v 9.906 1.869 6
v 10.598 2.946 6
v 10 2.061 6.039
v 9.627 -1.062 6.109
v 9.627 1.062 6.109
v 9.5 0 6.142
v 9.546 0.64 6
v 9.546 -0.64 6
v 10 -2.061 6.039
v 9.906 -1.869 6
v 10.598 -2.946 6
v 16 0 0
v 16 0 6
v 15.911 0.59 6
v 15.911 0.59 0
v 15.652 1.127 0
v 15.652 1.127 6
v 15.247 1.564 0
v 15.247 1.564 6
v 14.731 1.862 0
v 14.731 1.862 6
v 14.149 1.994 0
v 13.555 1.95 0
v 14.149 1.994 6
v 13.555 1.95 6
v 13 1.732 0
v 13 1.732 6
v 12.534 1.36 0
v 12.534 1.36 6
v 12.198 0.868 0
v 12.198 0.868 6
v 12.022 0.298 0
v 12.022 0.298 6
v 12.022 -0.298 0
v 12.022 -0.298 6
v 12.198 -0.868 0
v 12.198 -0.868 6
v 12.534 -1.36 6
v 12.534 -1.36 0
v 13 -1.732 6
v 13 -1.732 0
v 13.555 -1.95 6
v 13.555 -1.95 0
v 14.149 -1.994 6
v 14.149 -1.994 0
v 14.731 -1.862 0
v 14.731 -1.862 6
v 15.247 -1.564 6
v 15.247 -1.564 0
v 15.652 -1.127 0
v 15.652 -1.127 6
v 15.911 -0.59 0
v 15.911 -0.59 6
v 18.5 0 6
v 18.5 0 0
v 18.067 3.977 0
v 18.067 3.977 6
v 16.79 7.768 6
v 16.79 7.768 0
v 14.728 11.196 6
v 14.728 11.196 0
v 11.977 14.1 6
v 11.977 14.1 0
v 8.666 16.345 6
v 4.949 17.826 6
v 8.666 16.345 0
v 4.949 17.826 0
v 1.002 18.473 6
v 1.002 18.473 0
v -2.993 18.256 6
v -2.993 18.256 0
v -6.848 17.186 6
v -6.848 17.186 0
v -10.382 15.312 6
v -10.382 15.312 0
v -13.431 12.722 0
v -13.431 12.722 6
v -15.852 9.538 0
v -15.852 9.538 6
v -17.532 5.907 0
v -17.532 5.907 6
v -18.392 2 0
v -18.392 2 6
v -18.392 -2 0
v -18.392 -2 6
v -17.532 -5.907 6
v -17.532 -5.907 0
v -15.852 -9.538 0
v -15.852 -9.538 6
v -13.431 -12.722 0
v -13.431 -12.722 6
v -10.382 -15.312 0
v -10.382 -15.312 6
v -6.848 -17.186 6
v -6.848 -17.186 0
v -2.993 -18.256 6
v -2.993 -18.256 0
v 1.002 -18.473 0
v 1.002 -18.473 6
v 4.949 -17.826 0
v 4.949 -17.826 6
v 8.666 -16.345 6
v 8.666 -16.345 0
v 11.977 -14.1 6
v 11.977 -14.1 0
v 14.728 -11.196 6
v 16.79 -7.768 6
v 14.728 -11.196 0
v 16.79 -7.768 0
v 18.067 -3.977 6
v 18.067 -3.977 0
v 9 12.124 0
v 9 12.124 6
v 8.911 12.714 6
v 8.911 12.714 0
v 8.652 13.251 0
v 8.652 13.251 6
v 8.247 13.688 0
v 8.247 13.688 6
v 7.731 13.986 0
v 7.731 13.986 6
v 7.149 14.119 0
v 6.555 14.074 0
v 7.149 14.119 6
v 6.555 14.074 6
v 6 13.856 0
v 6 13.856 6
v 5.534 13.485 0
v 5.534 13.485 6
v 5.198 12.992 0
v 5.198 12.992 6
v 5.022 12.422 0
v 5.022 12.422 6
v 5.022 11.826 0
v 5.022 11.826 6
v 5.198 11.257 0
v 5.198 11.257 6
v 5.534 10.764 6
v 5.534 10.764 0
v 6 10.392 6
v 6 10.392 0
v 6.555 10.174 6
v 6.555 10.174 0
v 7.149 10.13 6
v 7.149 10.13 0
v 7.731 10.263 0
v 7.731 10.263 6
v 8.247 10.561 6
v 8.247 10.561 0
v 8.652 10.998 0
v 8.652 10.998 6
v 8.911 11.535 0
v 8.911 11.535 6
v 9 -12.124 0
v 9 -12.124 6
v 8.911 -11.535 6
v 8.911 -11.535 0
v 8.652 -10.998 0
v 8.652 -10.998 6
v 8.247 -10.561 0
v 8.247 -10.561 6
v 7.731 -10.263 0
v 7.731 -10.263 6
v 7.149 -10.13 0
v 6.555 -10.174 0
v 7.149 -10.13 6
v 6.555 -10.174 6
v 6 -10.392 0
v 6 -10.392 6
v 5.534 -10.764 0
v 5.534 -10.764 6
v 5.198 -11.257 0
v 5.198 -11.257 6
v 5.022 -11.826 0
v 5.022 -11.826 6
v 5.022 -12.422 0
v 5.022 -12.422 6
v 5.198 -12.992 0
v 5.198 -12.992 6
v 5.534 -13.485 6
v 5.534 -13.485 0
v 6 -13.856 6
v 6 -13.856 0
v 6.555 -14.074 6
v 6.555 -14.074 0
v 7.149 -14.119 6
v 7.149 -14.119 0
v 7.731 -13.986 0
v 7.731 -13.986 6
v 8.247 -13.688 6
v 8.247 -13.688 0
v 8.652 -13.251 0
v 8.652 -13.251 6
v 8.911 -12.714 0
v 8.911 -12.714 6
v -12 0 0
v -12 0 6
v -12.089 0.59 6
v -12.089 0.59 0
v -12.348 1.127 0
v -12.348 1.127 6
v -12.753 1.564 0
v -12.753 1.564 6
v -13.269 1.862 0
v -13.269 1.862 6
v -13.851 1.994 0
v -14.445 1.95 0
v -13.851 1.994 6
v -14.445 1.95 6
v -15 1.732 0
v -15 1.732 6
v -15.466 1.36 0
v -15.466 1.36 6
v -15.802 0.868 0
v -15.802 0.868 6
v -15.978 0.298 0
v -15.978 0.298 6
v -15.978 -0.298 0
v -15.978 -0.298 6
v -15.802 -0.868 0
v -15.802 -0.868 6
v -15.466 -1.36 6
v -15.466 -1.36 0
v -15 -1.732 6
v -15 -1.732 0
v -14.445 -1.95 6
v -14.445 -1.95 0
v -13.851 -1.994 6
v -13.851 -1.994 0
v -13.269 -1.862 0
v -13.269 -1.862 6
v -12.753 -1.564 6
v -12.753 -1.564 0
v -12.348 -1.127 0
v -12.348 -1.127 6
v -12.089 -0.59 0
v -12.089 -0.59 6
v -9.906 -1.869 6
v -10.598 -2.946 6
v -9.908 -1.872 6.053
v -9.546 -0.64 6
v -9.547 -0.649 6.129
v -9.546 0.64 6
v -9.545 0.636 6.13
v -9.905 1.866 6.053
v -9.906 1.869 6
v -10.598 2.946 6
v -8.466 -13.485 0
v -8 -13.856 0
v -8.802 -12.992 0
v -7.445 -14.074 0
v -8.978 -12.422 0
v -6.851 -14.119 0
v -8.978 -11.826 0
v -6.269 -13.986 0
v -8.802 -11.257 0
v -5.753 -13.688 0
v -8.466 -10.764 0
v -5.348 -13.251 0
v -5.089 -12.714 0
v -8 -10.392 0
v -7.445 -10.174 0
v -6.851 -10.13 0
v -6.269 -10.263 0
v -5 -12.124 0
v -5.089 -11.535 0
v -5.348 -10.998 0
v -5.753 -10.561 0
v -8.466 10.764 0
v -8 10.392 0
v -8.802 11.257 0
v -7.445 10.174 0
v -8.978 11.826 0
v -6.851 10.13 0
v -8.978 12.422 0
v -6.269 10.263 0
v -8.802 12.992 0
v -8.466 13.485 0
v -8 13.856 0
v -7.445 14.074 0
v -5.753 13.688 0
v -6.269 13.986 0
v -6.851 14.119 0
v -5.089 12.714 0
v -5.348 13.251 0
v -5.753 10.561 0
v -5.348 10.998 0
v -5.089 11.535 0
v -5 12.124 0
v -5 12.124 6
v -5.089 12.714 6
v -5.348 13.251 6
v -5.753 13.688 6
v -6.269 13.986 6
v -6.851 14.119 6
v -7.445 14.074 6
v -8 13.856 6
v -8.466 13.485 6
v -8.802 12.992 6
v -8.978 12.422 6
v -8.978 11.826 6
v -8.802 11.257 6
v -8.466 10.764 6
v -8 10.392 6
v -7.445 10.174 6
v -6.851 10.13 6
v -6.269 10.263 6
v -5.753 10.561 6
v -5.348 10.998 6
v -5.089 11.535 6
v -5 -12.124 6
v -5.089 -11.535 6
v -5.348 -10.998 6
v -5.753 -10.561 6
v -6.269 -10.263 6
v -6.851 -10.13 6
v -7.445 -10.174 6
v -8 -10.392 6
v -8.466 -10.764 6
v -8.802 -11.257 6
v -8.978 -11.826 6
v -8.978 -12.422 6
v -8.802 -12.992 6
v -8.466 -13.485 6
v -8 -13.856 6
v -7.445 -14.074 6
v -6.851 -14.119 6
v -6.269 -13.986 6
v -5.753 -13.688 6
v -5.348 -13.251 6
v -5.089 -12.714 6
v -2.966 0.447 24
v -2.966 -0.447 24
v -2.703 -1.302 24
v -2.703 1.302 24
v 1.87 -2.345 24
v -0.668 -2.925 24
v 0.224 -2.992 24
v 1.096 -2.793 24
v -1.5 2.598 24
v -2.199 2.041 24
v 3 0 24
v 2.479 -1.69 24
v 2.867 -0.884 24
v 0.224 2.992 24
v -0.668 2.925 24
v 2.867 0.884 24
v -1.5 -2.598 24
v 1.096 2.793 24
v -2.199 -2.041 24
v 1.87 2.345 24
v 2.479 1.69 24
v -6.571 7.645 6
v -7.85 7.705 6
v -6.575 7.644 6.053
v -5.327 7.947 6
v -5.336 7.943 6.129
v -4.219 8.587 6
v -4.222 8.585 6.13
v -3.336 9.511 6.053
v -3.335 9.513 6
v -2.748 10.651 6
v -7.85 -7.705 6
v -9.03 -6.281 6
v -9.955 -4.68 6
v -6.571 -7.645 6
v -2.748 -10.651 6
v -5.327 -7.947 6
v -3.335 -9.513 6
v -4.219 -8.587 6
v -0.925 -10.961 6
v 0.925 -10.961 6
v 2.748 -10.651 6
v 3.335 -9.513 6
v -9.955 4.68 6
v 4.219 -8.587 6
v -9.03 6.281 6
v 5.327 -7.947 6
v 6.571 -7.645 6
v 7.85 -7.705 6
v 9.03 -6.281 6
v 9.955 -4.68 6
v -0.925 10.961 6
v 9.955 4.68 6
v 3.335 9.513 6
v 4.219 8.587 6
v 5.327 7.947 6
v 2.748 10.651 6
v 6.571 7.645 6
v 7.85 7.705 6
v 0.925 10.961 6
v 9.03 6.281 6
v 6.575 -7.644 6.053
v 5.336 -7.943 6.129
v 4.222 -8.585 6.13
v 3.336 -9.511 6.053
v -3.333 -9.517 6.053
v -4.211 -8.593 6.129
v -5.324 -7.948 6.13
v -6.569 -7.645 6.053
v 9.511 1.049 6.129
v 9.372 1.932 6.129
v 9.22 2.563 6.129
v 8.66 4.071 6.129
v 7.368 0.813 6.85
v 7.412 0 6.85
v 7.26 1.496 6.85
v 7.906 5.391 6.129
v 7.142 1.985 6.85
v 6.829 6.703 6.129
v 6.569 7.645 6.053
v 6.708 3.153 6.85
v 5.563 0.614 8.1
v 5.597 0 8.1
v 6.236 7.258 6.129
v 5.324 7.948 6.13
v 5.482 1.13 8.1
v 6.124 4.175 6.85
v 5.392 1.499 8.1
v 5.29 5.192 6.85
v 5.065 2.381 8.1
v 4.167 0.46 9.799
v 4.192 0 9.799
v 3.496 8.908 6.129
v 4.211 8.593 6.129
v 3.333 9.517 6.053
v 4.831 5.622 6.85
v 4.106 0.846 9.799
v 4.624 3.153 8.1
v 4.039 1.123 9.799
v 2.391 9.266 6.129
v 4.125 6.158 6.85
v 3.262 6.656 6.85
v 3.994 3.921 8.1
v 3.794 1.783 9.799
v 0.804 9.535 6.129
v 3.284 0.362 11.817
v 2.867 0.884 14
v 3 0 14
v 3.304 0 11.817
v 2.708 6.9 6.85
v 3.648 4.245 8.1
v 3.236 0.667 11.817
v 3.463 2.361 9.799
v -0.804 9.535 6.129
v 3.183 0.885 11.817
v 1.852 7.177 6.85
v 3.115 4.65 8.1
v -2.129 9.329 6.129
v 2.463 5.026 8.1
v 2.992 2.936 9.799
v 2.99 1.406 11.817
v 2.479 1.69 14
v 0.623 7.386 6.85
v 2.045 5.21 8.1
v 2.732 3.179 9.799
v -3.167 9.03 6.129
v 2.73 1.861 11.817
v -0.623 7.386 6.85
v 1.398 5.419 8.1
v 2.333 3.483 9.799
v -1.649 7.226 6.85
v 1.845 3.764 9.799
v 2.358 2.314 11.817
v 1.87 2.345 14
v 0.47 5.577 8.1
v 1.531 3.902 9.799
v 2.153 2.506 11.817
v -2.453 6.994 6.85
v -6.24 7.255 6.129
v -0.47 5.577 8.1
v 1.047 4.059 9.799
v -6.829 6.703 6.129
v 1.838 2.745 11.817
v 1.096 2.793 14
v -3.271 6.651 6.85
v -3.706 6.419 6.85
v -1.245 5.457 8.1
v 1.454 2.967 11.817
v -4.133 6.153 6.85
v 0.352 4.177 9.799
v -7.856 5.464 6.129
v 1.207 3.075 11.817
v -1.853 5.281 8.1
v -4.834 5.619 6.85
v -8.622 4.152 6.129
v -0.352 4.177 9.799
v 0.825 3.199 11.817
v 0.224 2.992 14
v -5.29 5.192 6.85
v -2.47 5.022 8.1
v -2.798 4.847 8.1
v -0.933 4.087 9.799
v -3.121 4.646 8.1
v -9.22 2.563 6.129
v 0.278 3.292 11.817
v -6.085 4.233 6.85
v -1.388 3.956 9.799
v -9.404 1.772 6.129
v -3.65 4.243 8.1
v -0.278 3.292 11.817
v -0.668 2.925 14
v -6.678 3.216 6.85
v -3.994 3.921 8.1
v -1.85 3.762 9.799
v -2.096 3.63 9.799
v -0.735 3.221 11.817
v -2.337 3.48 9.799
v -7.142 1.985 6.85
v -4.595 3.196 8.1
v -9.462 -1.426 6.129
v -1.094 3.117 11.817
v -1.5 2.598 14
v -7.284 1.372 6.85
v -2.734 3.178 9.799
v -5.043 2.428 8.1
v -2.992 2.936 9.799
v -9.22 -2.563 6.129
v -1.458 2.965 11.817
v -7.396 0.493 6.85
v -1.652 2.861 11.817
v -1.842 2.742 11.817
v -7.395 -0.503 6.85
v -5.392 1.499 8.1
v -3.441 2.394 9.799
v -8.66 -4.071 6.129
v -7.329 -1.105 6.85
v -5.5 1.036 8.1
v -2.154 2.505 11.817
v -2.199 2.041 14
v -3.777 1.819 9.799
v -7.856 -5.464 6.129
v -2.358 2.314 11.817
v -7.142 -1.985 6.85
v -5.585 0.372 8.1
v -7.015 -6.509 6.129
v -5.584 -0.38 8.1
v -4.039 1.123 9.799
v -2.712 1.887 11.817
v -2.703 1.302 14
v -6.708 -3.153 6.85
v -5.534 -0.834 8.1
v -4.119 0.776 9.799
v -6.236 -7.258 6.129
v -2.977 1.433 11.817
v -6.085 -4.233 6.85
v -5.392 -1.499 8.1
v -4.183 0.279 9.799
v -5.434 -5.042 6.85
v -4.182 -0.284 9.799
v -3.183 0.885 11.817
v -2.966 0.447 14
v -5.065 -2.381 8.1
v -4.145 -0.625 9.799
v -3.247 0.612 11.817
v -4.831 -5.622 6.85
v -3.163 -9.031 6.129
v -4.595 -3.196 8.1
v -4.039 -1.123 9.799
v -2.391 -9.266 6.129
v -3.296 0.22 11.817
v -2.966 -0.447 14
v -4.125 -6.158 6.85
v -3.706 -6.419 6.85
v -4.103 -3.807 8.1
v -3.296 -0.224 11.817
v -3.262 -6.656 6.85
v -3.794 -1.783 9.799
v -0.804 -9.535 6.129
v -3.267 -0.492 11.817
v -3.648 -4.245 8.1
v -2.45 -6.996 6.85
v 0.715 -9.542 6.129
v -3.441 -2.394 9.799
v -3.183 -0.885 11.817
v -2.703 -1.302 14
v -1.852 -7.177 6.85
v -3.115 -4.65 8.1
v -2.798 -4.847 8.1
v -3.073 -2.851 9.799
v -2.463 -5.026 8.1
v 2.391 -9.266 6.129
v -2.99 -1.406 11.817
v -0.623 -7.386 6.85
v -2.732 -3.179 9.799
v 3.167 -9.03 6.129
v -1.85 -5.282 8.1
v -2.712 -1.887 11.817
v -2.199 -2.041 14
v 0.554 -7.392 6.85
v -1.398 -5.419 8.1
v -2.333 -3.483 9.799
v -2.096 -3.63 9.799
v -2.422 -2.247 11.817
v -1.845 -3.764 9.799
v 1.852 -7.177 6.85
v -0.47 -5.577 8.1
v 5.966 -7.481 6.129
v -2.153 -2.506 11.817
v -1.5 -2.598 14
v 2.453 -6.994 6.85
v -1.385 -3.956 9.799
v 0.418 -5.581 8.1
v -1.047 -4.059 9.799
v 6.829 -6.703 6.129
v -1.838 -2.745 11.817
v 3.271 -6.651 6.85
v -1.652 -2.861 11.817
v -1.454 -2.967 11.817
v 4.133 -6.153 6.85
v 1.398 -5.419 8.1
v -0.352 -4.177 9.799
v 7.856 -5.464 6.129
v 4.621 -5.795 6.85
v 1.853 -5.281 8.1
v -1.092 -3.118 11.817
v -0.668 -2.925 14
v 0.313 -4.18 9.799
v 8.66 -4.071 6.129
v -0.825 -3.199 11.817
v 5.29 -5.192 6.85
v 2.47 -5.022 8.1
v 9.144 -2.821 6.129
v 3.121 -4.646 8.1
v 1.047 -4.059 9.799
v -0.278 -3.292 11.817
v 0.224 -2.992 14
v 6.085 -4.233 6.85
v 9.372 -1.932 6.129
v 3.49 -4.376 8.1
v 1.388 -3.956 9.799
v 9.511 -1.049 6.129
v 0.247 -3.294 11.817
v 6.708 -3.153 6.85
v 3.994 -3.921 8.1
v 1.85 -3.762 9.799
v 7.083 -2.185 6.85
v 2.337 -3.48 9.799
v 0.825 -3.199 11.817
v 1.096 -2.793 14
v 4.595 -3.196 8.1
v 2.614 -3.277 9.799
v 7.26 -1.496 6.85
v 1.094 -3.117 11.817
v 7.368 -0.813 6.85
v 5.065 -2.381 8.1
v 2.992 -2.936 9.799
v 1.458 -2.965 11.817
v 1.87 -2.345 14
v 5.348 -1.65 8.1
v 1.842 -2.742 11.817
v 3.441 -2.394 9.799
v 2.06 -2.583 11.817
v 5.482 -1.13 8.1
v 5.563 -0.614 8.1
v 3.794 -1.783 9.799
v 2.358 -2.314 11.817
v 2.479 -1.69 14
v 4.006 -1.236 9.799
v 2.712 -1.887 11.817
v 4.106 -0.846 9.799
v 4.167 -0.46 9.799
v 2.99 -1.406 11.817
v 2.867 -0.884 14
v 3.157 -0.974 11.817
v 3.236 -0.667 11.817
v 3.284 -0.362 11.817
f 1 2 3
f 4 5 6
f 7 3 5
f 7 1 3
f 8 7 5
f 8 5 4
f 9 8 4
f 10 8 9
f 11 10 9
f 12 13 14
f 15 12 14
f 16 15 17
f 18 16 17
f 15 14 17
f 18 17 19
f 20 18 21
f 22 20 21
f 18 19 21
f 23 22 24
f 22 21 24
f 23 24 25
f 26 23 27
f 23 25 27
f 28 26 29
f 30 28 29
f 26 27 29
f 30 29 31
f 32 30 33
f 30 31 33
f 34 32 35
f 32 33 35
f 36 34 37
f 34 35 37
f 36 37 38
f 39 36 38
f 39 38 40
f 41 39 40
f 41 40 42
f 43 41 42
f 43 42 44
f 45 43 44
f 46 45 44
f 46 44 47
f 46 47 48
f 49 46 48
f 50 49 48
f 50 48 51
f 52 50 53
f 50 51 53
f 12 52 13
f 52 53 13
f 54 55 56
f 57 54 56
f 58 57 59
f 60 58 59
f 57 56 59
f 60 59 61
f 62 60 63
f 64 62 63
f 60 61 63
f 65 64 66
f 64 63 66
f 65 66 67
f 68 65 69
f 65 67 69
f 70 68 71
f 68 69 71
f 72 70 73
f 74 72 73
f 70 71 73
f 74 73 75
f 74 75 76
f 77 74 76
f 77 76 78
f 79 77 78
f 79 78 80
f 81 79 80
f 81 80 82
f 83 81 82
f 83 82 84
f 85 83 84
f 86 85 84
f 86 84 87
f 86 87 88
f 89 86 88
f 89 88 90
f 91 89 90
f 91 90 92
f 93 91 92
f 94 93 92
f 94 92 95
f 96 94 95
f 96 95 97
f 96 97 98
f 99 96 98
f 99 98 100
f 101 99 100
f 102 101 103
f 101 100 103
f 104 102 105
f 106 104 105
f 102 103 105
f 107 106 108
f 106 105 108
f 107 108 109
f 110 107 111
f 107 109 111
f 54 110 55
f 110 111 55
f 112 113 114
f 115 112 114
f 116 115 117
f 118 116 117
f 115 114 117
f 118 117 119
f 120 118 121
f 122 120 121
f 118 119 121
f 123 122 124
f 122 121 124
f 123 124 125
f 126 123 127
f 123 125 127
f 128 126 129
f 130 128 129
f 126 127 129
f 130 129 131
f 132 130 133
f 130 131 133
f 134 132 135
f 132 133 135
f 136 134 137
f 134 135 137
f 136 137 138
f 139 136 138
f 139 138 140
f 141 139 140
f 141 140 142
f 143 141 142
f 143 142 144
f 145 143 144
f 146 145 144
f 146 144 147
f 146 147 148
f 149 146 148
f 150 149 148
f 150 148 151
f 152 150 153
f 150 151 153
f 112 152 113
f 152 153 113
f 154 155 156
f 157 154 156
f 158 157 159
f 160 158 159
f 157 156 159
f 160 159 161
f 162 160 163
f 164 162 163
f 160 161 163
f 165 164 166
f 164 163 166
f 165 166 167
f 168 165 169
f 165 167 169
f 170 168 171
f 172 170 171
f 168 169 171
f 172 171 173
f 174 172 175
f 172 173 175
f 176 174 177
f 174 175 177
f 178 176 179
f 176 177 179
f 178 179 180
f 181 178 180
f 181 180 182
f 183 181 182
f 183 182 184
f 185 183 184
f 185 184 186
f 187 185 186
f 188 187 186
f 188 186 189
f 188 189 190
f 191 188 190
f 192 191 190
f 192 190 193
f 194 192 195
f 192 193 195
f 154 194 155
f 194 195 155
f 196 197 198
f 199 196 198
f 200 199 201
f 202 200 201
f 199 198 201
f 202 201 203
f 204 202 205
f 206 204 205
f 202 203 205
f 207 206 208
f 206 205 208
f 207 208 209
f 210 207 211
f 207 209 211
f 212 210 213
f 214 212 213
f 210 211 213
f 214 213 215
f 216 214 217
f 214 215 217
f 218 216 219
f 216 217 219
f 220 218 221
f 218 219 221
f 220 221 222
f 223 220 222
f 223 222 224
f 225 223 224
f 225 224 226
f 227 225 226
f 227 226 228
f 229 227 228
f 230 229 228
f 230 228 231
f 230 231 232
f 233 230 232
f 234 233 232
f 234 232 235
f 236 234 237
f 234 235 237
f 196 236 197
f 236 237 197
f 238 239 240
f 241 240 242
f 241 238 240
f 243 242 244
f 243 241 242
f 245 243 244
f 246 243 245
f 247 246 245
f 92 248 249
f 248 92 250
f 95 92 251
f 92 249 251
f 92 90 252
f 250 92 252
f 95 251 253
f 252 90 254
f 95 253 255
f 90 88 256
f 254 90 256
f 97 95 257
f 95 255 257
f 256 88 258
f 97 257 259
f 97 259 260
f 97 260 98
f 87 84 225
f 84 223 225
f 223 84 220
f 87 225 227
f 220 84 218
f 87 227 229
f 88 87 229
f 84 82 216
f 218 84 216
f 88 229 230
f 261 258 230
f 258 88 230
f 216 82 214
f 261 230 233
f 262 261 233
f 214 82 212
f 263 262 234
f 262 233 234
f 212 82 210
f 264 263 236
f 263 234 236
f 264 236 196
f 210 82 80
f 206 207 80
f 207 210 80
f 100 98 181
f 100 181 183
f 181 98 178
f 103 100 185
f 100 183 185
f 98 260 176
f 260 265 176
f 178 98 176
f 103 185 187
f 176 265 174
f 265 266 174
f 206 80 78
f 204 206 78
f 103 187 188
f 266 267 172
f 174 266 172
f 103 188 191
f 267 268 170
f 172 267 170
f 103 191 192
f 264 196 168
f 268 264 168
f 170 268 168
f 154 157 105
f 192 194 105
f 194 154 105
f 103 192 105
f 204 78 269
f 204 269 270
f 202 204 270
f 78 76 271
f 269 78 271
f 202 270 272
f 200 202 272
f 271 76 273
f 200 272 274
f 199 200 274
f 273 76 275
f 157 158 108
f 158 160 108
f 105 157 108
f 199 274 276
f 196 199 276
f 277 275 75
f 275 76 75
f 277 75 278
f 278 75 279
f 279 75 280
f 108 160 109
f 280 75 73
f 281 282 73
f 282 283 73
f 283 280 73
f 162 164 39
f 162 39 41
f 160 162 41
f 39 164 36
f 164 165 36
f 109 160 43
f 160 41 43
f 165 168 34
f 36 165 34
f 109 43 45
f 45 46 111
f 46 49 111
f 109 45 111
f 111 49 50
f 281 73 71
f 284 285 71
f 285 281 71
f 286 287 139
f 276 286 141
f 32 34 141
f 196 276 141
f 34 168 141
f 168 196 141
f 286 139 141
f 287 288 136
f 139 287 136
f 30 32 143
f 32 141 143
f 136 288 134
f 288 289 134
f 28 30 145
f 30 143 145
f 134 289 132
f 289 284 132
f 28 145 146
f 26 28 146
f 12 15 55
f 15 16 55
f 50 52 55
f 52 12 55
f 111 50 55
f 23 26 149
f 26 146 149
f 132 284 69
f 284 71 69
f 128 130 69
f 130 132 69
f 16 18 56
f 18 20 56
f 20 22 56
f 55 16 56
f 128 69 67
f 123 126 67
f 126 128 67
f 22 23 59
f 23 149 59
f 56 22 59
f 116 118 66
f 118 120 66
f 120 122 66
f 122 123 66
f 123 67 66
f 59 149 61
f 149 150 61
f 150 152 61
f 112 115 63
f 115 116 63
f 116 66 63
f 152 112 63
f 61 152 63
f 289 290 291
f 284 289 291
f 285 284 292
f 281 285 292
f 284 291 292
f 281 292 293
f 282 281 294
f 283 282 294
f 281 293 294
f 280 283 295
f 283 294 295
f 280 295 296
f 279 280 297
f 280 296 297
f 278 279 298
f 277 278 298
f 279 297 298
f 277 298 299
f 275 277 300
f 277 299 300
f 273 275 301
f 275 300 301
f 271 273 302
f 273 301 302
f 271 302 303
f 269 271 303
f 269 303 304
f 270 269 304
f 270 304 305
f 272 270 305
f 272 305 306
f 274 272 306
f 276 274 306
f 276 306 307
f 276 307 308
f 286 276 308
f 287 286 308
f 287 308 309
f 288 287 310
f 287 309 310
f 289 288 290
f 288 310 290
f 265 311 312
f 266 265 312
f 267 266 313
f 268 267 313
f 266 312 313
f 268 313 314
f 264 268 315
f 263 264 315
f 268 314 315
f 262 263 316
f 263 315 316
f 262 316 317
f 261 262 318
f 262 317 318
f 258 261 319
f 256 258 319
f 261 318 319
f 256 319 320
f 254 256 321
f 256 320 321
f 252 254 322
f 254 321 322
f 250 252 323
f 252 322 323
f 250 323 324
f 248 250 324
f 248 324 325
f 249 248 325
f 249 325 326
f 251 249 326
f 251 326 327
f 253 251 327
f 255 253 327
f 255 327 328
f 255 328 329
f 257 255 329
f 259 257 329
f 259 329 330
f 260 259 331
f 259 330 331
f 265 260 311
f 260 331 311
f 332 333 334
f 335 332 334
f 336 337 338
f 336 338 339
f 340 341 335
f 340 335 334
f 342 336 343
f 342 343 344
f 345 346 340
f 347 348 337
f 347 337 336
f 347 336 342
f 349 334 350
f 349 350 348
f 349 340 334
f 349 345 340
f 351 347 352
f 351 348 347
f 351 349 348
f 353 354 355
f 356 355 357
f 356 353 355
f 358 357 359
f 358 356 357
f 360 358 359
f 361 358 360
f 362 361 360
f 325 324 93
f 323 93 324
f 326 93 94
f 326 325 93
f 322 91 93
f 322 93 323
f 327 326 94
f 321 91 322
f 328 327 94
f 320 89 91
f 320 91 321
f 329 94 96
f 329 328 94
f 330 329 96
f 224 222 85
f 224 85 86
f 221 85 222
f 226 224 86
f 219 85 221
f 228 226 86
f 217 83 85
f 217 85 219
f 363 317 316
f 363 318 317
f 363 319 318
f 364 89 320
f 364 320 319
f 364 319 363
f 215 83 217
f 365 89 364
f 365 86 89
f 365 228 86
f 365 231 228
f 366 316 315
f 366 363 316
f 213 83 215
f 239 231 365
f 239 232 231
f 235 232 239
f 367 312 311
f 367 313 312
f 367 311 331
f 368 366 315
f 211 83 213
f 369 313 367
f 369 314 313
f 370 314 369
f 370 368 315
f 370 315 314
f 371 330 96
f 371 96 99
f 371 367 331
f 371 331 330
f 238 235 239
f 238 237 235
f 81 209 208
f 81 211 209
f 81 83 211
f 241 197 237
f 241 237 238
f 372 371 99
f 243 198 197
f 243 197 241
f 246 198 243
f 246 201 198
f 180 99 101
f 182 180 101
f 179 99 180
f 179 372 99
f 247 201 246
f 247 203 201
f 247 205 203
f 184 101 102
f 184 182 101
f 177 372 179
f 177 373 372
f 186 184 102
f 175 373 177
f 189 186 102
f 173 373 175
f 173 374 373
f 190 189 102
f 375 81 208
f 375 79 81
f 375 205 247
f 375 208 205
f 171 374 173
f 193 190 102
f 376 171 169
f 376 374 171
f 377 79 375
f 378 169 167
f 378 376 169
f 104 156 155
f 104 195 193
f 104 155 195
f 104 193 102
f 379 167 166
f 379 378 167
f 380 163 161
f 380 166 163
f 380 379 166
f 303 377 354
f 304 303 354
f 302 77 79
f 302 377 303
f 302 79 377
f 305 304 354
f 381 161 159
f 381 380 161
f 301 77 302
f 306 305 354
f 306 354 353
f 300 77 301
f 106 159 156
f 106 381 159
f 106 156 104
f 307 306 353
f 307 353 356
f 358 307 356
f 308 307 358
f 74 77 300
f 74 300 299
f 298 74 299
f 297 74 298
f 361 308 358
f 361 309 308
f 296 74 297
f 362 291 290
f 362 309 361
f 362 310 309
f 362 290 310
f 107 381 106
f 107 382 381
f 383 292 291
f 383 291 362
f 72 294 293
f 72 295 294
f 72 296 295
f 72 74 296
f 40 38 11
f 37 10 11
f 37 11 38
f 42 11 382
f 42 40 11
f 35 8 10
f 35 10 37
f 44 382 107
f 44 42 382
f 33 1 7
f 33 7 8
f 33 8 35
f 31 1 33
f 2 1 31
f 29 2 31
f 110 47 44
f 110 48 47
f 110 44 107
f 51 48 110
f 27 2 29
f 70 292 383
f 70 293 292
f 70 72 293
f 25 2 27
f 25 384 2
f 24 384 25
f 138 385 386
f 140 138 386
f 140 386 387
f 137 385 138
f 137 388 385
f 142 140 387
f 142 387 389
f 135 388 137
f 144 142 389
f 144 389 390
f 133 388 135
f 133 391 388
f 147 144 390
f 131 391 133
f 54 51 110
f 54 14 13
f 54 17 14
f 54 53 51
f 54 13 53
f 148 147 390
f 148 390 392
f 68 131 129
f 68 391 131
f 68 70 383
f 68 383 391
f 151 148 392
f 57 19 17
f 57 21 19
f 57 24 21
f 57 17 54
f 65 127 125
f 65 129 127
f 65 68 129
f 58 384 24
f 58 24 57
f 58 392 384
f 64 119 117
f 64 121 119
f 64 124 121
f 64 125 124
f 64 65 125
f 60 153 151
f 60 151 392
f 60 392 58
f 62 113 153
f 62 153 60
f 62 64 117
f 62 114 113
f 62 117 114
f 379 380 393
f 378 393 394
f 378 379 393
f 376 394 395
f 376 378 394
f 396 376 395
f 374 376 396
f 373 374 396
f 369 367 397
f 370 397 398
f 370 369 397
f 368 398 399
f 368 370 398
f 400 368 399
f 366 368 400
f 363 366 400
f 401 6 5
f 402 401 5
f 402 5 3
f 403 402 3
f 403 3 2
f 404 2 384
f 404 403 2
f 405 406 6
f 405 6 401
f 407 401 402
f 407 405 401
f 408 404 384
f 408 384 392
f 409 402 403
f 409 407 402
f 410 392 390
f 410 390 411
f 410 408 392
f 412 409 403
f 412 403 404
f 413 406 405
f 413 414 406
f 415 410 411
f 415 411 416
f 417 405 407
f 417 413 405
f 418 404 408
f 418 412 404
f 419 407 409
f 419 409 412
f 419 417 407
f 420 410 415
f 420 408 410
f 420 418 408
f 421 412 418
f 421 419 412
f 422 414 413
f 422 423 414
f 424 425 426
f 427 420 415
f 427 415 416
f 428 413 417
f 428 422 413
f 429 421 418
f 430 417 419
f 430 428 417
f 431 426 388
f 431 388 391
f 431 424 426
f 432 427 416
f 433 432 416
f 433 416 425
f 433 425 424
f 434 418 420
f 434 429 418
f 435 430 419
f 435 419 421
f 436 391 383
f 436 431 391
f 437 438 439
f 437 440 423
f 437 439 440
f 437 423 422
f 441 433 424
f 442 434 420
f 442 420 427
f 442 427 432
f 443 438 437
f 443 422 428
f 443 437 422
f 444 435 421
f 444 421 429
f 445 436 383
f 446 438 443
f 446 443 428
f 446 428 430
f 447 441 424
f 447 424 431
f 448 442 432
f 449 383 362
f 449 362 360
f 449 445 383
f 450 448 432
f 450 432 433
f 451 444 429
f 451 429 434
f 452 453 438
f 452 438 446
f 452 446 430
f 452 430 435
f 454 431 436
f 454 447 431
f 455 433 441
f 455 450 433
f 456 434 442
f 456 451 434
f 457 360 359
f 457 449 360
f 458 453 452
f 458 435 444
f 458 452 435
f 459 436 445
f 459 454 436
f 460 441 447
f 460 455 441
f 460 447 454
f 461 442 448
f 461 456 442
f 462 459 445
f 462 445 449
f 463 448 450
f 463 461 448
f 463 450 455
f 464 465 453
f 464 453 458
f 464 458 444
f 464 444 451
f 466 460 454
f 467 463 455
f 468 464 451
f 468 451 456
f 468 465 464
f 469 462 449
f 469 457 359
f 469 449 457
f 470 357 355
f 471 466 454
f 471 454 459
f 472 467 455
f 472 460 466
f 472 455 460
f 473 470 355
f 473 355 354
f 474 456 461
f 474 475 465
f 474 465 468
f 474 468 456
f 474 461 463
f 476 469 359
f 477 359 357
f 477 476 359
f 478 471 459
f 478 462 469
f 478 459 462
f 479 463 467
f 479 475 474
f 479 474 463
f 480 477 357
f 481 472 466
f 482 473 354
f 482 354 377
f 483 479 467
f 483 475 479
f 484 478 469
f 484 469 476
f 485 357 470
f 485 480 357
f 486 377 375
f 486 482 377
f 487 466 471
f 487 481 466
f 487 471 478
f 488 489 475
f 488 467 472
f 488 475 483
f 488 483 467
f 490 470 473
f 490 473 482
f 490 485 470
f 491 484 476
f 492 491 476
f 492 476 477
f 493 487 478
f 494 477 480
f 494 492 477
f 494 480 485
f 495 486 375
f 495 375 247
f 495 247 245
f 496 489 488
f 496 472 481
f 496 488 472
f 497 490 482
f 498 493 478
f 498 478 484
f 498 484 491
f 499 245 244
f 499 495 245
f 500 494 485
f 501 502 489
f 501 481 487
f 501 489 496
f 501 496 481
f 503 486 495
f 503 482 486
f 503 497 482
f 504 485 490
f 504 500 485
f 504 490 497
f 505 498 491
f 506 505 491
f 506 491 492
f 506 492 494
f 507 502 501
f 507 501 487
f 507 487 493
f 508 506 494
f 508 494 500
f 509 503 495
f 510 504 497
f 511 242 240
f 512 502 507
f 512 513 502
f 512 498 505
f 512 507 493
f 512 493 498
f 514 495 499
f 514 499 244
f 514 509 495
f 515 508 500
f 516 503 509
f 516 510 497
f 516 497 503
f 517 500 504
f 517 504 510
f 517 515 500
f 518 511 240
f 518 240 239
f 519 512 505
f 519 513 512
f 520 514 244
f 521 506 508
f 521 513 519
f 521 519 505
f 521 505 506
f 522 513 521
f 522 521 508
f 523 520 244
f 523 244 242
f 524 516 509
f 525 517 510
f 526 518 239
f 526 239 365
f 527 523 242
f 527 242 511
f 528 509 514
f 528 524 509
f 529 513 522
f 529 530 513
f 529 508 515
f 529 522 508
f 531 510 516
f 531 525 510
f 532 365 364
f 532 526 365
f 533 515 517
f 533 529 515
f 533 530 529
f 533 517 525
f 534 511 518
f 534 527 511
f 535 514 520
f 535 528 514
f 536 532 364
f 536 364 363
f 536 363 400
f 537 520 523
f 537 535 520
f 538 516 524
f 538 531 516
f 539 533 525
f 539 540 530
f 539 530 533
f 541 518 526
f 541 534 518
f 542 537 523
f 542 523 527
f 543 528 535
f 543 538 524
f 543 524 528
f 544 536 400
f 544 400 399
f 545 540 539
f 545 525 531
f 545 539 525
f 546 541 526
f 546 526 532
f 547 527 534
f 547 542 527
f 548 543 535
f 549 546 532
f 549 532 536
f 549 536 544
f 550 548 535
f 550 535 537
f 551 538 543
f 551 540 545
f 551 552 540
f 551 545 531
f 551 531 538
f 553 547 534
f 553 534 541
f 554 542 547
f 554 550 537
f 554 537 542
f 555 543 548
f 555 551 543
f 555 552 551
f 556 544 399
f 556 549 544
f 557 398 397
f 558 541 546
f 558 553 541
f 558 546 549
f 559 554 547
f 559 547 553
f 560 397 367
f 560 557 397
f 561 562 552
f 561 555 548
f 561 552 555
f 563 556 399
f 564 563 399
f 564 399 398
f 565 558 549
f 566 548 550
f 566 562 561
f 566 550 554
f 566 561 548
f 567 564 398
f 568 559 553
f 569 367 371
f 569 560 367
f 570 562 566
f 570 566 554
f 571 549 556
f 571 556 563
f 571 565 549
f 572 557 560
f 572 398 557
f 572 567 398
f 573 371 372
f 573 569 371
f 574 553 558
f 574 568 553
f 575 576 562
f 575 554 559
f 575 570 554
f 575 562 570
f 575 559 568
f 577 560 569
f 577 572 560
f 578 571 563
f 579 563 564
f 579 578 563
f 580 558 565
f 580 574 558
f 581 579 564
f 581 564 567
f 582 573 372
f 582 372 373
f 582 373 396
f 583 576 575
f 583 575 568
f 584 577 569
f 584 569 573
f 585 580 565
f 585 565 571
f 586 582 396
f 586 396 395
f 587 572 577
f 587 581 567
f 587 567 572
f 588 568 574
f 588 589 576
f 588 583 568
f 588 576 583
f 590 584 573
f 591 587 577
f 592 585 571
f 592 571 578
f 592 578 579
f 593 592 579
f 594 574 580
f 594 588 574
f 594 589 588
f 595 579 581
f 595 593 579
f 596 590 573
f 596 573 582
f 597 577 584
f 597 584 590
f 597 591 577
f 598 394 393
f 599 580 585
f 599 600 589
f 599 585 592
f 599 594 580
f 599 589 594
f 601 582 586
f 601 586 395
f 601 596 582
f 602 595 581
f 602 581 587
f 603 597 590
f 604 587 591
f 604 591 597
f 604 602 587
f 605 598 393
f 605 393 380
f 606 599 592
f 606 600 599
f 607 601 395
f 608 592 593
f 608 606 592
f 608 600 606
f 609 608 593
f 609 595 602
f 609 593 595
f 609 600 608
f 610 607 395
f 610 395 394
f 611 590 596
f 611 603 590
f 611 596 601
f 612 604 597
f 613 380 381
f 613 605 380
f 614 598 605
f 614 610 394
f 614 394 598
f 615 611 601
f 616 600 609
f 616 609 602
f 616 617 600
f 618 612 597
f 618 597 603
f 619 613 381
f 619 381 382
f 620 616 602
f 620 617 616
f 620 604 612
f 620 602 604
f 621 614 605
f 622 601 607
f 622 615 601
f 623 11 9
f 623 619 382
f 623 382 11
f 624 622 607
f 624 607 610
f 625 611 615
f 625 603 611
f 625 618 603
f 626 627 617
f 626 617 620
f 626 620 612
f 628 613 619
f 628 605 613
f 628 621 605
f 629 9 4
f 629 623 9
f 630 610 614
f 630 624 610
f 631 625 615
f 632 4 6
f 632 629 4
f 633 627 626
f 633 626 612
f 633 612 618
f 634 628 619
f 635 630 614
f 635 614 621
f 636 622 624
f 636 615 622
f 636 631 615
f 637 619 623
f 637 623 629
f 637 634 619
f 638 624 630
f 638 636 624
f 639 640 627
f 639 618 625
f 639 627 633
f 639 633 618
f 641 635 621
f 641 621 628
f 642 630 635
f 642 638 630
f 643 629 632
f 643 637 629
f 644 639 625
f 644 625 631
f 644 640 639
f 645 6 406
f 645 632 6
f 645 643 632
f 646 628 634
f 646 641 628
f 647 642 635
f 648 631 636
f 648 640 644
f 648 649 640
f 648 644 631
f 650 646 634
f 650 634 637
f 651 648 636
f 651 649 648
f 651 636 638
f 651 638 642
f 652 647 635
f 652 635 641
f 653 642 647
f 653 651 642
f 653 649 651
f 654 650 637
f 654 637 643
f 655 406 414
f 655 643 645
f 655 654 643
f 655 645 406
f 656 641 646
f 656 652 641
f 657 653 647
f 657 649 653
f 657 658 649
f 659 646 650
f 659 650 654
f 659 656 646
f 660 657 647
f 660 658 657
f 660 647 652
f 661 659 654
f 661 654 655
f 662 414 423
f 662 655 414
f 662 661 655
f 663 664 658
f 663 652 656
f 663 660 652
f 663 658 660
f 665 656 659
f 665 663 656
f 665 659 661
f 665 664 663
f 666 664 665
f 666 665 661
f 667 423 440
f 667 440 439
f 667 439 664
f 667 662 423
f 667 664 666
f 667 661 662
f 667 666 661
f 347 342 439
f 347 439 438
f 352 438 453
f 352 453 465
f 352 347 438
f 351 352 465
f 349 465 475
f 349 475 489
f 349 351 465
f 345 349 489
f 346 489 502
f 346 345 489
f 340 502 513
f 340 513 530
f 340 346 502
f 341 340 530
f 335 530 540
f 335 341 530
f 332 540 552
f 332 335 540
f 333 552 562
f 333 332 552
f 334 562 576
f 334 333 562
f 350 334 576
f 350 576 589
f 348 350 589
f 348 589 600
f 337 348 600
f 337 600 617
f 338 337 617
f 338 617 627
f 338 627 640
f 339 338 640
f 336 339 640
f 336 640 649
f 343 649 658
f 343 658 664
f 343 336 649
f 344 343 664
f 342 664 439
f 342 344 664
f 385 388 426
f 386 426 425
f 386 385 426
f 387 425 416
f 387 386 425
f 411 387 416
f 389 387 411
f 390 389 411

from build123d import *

# Parameters (mm, degrees)
SKETCH1_R           = 18.5
BOSS_EXTRUDE1_DEPTH = 6
SKETCH3_R           = 2
CUT_EXTRUDE1_DEPTH  = 6
SKETCH7_R           = 3
BOSS_EXTRUDE4_DEPTH = 18
FILLET3_R           = 8
SKETCH8_R           = 4.5
CUT_EXTRUDE2_DEPTH  = 10


with BuildPart() as part:
    # Sketch1 → Boss-Extrude1 (new body)
    with BuildSketch(Plane.XY):
        Circle(SKETCH1_R)
    extrude(amount=BOSS_EXTRUDE1_DEPTH)

    # Sketch3 → Cut-Extrude1 (cut)
    with BuildSketch(Plane.XY.offset(6)):
        with Locations((-14, 0)):
            Circle(SKETCH3_R)
        with Locations((-7, 12.124355653)):
            Circle(SKETCH3_R)
        with Locations((7, 12.124355653)):
            Circle(SKETCH3_R)
        with Locations((14, 0)):
            Circle(SKETCH3_R)
        with Locations((7, -12.124355653)):
            Circle(SKETCH3_R)
        with Locations((-7, -12.124355653)):
            Circle(SKETCH3_R)
    extrude(amount=-CUT_EXTRUDE1_DEPTH, mode=Mode.SUBTRACT)

    # Sketch7 → Boss-Extrude4 (add)
    with BuildSketch(Plane.XY.offset(24)):
        Circle(SKETCH7_R)
    extrude(amount=-BOSS_EXTRUDE4_DEPTH)

    # Fillet3
    fillet3_edges = [part.edges().sort_by_distance(p)[0] for p in [
        (-3, 0, 6),
    ]]
    fillet(fillet3_edges, radius=FILLET3_R)

    # Sketch8 → Cut-Extrude2 (cut)
    with BuildSketch(Plane.XY.offset(6)):
        with Locations((-14, 0)):
            Circle(SKETCH8_R)
        with Locations((-7, 12.124355653)):
            Circle(SKETCH8_R)
        with Locations((7, 12.124355653)):
            Circle(SKETCH8_R)
        with Locations((14, 0)):
            Circle(SKETCH8_R)
        with Locations((7, -12.124355653)):
            Circle(SKETCH8_R)
        with Locations((-7, -12.124355653)):
            Circle(SKETCH8_R)
    extrude(amount=CUT_EXTRUDE2_DEPTH, mode=Mode.SUBTRACT)


solid = part.part
